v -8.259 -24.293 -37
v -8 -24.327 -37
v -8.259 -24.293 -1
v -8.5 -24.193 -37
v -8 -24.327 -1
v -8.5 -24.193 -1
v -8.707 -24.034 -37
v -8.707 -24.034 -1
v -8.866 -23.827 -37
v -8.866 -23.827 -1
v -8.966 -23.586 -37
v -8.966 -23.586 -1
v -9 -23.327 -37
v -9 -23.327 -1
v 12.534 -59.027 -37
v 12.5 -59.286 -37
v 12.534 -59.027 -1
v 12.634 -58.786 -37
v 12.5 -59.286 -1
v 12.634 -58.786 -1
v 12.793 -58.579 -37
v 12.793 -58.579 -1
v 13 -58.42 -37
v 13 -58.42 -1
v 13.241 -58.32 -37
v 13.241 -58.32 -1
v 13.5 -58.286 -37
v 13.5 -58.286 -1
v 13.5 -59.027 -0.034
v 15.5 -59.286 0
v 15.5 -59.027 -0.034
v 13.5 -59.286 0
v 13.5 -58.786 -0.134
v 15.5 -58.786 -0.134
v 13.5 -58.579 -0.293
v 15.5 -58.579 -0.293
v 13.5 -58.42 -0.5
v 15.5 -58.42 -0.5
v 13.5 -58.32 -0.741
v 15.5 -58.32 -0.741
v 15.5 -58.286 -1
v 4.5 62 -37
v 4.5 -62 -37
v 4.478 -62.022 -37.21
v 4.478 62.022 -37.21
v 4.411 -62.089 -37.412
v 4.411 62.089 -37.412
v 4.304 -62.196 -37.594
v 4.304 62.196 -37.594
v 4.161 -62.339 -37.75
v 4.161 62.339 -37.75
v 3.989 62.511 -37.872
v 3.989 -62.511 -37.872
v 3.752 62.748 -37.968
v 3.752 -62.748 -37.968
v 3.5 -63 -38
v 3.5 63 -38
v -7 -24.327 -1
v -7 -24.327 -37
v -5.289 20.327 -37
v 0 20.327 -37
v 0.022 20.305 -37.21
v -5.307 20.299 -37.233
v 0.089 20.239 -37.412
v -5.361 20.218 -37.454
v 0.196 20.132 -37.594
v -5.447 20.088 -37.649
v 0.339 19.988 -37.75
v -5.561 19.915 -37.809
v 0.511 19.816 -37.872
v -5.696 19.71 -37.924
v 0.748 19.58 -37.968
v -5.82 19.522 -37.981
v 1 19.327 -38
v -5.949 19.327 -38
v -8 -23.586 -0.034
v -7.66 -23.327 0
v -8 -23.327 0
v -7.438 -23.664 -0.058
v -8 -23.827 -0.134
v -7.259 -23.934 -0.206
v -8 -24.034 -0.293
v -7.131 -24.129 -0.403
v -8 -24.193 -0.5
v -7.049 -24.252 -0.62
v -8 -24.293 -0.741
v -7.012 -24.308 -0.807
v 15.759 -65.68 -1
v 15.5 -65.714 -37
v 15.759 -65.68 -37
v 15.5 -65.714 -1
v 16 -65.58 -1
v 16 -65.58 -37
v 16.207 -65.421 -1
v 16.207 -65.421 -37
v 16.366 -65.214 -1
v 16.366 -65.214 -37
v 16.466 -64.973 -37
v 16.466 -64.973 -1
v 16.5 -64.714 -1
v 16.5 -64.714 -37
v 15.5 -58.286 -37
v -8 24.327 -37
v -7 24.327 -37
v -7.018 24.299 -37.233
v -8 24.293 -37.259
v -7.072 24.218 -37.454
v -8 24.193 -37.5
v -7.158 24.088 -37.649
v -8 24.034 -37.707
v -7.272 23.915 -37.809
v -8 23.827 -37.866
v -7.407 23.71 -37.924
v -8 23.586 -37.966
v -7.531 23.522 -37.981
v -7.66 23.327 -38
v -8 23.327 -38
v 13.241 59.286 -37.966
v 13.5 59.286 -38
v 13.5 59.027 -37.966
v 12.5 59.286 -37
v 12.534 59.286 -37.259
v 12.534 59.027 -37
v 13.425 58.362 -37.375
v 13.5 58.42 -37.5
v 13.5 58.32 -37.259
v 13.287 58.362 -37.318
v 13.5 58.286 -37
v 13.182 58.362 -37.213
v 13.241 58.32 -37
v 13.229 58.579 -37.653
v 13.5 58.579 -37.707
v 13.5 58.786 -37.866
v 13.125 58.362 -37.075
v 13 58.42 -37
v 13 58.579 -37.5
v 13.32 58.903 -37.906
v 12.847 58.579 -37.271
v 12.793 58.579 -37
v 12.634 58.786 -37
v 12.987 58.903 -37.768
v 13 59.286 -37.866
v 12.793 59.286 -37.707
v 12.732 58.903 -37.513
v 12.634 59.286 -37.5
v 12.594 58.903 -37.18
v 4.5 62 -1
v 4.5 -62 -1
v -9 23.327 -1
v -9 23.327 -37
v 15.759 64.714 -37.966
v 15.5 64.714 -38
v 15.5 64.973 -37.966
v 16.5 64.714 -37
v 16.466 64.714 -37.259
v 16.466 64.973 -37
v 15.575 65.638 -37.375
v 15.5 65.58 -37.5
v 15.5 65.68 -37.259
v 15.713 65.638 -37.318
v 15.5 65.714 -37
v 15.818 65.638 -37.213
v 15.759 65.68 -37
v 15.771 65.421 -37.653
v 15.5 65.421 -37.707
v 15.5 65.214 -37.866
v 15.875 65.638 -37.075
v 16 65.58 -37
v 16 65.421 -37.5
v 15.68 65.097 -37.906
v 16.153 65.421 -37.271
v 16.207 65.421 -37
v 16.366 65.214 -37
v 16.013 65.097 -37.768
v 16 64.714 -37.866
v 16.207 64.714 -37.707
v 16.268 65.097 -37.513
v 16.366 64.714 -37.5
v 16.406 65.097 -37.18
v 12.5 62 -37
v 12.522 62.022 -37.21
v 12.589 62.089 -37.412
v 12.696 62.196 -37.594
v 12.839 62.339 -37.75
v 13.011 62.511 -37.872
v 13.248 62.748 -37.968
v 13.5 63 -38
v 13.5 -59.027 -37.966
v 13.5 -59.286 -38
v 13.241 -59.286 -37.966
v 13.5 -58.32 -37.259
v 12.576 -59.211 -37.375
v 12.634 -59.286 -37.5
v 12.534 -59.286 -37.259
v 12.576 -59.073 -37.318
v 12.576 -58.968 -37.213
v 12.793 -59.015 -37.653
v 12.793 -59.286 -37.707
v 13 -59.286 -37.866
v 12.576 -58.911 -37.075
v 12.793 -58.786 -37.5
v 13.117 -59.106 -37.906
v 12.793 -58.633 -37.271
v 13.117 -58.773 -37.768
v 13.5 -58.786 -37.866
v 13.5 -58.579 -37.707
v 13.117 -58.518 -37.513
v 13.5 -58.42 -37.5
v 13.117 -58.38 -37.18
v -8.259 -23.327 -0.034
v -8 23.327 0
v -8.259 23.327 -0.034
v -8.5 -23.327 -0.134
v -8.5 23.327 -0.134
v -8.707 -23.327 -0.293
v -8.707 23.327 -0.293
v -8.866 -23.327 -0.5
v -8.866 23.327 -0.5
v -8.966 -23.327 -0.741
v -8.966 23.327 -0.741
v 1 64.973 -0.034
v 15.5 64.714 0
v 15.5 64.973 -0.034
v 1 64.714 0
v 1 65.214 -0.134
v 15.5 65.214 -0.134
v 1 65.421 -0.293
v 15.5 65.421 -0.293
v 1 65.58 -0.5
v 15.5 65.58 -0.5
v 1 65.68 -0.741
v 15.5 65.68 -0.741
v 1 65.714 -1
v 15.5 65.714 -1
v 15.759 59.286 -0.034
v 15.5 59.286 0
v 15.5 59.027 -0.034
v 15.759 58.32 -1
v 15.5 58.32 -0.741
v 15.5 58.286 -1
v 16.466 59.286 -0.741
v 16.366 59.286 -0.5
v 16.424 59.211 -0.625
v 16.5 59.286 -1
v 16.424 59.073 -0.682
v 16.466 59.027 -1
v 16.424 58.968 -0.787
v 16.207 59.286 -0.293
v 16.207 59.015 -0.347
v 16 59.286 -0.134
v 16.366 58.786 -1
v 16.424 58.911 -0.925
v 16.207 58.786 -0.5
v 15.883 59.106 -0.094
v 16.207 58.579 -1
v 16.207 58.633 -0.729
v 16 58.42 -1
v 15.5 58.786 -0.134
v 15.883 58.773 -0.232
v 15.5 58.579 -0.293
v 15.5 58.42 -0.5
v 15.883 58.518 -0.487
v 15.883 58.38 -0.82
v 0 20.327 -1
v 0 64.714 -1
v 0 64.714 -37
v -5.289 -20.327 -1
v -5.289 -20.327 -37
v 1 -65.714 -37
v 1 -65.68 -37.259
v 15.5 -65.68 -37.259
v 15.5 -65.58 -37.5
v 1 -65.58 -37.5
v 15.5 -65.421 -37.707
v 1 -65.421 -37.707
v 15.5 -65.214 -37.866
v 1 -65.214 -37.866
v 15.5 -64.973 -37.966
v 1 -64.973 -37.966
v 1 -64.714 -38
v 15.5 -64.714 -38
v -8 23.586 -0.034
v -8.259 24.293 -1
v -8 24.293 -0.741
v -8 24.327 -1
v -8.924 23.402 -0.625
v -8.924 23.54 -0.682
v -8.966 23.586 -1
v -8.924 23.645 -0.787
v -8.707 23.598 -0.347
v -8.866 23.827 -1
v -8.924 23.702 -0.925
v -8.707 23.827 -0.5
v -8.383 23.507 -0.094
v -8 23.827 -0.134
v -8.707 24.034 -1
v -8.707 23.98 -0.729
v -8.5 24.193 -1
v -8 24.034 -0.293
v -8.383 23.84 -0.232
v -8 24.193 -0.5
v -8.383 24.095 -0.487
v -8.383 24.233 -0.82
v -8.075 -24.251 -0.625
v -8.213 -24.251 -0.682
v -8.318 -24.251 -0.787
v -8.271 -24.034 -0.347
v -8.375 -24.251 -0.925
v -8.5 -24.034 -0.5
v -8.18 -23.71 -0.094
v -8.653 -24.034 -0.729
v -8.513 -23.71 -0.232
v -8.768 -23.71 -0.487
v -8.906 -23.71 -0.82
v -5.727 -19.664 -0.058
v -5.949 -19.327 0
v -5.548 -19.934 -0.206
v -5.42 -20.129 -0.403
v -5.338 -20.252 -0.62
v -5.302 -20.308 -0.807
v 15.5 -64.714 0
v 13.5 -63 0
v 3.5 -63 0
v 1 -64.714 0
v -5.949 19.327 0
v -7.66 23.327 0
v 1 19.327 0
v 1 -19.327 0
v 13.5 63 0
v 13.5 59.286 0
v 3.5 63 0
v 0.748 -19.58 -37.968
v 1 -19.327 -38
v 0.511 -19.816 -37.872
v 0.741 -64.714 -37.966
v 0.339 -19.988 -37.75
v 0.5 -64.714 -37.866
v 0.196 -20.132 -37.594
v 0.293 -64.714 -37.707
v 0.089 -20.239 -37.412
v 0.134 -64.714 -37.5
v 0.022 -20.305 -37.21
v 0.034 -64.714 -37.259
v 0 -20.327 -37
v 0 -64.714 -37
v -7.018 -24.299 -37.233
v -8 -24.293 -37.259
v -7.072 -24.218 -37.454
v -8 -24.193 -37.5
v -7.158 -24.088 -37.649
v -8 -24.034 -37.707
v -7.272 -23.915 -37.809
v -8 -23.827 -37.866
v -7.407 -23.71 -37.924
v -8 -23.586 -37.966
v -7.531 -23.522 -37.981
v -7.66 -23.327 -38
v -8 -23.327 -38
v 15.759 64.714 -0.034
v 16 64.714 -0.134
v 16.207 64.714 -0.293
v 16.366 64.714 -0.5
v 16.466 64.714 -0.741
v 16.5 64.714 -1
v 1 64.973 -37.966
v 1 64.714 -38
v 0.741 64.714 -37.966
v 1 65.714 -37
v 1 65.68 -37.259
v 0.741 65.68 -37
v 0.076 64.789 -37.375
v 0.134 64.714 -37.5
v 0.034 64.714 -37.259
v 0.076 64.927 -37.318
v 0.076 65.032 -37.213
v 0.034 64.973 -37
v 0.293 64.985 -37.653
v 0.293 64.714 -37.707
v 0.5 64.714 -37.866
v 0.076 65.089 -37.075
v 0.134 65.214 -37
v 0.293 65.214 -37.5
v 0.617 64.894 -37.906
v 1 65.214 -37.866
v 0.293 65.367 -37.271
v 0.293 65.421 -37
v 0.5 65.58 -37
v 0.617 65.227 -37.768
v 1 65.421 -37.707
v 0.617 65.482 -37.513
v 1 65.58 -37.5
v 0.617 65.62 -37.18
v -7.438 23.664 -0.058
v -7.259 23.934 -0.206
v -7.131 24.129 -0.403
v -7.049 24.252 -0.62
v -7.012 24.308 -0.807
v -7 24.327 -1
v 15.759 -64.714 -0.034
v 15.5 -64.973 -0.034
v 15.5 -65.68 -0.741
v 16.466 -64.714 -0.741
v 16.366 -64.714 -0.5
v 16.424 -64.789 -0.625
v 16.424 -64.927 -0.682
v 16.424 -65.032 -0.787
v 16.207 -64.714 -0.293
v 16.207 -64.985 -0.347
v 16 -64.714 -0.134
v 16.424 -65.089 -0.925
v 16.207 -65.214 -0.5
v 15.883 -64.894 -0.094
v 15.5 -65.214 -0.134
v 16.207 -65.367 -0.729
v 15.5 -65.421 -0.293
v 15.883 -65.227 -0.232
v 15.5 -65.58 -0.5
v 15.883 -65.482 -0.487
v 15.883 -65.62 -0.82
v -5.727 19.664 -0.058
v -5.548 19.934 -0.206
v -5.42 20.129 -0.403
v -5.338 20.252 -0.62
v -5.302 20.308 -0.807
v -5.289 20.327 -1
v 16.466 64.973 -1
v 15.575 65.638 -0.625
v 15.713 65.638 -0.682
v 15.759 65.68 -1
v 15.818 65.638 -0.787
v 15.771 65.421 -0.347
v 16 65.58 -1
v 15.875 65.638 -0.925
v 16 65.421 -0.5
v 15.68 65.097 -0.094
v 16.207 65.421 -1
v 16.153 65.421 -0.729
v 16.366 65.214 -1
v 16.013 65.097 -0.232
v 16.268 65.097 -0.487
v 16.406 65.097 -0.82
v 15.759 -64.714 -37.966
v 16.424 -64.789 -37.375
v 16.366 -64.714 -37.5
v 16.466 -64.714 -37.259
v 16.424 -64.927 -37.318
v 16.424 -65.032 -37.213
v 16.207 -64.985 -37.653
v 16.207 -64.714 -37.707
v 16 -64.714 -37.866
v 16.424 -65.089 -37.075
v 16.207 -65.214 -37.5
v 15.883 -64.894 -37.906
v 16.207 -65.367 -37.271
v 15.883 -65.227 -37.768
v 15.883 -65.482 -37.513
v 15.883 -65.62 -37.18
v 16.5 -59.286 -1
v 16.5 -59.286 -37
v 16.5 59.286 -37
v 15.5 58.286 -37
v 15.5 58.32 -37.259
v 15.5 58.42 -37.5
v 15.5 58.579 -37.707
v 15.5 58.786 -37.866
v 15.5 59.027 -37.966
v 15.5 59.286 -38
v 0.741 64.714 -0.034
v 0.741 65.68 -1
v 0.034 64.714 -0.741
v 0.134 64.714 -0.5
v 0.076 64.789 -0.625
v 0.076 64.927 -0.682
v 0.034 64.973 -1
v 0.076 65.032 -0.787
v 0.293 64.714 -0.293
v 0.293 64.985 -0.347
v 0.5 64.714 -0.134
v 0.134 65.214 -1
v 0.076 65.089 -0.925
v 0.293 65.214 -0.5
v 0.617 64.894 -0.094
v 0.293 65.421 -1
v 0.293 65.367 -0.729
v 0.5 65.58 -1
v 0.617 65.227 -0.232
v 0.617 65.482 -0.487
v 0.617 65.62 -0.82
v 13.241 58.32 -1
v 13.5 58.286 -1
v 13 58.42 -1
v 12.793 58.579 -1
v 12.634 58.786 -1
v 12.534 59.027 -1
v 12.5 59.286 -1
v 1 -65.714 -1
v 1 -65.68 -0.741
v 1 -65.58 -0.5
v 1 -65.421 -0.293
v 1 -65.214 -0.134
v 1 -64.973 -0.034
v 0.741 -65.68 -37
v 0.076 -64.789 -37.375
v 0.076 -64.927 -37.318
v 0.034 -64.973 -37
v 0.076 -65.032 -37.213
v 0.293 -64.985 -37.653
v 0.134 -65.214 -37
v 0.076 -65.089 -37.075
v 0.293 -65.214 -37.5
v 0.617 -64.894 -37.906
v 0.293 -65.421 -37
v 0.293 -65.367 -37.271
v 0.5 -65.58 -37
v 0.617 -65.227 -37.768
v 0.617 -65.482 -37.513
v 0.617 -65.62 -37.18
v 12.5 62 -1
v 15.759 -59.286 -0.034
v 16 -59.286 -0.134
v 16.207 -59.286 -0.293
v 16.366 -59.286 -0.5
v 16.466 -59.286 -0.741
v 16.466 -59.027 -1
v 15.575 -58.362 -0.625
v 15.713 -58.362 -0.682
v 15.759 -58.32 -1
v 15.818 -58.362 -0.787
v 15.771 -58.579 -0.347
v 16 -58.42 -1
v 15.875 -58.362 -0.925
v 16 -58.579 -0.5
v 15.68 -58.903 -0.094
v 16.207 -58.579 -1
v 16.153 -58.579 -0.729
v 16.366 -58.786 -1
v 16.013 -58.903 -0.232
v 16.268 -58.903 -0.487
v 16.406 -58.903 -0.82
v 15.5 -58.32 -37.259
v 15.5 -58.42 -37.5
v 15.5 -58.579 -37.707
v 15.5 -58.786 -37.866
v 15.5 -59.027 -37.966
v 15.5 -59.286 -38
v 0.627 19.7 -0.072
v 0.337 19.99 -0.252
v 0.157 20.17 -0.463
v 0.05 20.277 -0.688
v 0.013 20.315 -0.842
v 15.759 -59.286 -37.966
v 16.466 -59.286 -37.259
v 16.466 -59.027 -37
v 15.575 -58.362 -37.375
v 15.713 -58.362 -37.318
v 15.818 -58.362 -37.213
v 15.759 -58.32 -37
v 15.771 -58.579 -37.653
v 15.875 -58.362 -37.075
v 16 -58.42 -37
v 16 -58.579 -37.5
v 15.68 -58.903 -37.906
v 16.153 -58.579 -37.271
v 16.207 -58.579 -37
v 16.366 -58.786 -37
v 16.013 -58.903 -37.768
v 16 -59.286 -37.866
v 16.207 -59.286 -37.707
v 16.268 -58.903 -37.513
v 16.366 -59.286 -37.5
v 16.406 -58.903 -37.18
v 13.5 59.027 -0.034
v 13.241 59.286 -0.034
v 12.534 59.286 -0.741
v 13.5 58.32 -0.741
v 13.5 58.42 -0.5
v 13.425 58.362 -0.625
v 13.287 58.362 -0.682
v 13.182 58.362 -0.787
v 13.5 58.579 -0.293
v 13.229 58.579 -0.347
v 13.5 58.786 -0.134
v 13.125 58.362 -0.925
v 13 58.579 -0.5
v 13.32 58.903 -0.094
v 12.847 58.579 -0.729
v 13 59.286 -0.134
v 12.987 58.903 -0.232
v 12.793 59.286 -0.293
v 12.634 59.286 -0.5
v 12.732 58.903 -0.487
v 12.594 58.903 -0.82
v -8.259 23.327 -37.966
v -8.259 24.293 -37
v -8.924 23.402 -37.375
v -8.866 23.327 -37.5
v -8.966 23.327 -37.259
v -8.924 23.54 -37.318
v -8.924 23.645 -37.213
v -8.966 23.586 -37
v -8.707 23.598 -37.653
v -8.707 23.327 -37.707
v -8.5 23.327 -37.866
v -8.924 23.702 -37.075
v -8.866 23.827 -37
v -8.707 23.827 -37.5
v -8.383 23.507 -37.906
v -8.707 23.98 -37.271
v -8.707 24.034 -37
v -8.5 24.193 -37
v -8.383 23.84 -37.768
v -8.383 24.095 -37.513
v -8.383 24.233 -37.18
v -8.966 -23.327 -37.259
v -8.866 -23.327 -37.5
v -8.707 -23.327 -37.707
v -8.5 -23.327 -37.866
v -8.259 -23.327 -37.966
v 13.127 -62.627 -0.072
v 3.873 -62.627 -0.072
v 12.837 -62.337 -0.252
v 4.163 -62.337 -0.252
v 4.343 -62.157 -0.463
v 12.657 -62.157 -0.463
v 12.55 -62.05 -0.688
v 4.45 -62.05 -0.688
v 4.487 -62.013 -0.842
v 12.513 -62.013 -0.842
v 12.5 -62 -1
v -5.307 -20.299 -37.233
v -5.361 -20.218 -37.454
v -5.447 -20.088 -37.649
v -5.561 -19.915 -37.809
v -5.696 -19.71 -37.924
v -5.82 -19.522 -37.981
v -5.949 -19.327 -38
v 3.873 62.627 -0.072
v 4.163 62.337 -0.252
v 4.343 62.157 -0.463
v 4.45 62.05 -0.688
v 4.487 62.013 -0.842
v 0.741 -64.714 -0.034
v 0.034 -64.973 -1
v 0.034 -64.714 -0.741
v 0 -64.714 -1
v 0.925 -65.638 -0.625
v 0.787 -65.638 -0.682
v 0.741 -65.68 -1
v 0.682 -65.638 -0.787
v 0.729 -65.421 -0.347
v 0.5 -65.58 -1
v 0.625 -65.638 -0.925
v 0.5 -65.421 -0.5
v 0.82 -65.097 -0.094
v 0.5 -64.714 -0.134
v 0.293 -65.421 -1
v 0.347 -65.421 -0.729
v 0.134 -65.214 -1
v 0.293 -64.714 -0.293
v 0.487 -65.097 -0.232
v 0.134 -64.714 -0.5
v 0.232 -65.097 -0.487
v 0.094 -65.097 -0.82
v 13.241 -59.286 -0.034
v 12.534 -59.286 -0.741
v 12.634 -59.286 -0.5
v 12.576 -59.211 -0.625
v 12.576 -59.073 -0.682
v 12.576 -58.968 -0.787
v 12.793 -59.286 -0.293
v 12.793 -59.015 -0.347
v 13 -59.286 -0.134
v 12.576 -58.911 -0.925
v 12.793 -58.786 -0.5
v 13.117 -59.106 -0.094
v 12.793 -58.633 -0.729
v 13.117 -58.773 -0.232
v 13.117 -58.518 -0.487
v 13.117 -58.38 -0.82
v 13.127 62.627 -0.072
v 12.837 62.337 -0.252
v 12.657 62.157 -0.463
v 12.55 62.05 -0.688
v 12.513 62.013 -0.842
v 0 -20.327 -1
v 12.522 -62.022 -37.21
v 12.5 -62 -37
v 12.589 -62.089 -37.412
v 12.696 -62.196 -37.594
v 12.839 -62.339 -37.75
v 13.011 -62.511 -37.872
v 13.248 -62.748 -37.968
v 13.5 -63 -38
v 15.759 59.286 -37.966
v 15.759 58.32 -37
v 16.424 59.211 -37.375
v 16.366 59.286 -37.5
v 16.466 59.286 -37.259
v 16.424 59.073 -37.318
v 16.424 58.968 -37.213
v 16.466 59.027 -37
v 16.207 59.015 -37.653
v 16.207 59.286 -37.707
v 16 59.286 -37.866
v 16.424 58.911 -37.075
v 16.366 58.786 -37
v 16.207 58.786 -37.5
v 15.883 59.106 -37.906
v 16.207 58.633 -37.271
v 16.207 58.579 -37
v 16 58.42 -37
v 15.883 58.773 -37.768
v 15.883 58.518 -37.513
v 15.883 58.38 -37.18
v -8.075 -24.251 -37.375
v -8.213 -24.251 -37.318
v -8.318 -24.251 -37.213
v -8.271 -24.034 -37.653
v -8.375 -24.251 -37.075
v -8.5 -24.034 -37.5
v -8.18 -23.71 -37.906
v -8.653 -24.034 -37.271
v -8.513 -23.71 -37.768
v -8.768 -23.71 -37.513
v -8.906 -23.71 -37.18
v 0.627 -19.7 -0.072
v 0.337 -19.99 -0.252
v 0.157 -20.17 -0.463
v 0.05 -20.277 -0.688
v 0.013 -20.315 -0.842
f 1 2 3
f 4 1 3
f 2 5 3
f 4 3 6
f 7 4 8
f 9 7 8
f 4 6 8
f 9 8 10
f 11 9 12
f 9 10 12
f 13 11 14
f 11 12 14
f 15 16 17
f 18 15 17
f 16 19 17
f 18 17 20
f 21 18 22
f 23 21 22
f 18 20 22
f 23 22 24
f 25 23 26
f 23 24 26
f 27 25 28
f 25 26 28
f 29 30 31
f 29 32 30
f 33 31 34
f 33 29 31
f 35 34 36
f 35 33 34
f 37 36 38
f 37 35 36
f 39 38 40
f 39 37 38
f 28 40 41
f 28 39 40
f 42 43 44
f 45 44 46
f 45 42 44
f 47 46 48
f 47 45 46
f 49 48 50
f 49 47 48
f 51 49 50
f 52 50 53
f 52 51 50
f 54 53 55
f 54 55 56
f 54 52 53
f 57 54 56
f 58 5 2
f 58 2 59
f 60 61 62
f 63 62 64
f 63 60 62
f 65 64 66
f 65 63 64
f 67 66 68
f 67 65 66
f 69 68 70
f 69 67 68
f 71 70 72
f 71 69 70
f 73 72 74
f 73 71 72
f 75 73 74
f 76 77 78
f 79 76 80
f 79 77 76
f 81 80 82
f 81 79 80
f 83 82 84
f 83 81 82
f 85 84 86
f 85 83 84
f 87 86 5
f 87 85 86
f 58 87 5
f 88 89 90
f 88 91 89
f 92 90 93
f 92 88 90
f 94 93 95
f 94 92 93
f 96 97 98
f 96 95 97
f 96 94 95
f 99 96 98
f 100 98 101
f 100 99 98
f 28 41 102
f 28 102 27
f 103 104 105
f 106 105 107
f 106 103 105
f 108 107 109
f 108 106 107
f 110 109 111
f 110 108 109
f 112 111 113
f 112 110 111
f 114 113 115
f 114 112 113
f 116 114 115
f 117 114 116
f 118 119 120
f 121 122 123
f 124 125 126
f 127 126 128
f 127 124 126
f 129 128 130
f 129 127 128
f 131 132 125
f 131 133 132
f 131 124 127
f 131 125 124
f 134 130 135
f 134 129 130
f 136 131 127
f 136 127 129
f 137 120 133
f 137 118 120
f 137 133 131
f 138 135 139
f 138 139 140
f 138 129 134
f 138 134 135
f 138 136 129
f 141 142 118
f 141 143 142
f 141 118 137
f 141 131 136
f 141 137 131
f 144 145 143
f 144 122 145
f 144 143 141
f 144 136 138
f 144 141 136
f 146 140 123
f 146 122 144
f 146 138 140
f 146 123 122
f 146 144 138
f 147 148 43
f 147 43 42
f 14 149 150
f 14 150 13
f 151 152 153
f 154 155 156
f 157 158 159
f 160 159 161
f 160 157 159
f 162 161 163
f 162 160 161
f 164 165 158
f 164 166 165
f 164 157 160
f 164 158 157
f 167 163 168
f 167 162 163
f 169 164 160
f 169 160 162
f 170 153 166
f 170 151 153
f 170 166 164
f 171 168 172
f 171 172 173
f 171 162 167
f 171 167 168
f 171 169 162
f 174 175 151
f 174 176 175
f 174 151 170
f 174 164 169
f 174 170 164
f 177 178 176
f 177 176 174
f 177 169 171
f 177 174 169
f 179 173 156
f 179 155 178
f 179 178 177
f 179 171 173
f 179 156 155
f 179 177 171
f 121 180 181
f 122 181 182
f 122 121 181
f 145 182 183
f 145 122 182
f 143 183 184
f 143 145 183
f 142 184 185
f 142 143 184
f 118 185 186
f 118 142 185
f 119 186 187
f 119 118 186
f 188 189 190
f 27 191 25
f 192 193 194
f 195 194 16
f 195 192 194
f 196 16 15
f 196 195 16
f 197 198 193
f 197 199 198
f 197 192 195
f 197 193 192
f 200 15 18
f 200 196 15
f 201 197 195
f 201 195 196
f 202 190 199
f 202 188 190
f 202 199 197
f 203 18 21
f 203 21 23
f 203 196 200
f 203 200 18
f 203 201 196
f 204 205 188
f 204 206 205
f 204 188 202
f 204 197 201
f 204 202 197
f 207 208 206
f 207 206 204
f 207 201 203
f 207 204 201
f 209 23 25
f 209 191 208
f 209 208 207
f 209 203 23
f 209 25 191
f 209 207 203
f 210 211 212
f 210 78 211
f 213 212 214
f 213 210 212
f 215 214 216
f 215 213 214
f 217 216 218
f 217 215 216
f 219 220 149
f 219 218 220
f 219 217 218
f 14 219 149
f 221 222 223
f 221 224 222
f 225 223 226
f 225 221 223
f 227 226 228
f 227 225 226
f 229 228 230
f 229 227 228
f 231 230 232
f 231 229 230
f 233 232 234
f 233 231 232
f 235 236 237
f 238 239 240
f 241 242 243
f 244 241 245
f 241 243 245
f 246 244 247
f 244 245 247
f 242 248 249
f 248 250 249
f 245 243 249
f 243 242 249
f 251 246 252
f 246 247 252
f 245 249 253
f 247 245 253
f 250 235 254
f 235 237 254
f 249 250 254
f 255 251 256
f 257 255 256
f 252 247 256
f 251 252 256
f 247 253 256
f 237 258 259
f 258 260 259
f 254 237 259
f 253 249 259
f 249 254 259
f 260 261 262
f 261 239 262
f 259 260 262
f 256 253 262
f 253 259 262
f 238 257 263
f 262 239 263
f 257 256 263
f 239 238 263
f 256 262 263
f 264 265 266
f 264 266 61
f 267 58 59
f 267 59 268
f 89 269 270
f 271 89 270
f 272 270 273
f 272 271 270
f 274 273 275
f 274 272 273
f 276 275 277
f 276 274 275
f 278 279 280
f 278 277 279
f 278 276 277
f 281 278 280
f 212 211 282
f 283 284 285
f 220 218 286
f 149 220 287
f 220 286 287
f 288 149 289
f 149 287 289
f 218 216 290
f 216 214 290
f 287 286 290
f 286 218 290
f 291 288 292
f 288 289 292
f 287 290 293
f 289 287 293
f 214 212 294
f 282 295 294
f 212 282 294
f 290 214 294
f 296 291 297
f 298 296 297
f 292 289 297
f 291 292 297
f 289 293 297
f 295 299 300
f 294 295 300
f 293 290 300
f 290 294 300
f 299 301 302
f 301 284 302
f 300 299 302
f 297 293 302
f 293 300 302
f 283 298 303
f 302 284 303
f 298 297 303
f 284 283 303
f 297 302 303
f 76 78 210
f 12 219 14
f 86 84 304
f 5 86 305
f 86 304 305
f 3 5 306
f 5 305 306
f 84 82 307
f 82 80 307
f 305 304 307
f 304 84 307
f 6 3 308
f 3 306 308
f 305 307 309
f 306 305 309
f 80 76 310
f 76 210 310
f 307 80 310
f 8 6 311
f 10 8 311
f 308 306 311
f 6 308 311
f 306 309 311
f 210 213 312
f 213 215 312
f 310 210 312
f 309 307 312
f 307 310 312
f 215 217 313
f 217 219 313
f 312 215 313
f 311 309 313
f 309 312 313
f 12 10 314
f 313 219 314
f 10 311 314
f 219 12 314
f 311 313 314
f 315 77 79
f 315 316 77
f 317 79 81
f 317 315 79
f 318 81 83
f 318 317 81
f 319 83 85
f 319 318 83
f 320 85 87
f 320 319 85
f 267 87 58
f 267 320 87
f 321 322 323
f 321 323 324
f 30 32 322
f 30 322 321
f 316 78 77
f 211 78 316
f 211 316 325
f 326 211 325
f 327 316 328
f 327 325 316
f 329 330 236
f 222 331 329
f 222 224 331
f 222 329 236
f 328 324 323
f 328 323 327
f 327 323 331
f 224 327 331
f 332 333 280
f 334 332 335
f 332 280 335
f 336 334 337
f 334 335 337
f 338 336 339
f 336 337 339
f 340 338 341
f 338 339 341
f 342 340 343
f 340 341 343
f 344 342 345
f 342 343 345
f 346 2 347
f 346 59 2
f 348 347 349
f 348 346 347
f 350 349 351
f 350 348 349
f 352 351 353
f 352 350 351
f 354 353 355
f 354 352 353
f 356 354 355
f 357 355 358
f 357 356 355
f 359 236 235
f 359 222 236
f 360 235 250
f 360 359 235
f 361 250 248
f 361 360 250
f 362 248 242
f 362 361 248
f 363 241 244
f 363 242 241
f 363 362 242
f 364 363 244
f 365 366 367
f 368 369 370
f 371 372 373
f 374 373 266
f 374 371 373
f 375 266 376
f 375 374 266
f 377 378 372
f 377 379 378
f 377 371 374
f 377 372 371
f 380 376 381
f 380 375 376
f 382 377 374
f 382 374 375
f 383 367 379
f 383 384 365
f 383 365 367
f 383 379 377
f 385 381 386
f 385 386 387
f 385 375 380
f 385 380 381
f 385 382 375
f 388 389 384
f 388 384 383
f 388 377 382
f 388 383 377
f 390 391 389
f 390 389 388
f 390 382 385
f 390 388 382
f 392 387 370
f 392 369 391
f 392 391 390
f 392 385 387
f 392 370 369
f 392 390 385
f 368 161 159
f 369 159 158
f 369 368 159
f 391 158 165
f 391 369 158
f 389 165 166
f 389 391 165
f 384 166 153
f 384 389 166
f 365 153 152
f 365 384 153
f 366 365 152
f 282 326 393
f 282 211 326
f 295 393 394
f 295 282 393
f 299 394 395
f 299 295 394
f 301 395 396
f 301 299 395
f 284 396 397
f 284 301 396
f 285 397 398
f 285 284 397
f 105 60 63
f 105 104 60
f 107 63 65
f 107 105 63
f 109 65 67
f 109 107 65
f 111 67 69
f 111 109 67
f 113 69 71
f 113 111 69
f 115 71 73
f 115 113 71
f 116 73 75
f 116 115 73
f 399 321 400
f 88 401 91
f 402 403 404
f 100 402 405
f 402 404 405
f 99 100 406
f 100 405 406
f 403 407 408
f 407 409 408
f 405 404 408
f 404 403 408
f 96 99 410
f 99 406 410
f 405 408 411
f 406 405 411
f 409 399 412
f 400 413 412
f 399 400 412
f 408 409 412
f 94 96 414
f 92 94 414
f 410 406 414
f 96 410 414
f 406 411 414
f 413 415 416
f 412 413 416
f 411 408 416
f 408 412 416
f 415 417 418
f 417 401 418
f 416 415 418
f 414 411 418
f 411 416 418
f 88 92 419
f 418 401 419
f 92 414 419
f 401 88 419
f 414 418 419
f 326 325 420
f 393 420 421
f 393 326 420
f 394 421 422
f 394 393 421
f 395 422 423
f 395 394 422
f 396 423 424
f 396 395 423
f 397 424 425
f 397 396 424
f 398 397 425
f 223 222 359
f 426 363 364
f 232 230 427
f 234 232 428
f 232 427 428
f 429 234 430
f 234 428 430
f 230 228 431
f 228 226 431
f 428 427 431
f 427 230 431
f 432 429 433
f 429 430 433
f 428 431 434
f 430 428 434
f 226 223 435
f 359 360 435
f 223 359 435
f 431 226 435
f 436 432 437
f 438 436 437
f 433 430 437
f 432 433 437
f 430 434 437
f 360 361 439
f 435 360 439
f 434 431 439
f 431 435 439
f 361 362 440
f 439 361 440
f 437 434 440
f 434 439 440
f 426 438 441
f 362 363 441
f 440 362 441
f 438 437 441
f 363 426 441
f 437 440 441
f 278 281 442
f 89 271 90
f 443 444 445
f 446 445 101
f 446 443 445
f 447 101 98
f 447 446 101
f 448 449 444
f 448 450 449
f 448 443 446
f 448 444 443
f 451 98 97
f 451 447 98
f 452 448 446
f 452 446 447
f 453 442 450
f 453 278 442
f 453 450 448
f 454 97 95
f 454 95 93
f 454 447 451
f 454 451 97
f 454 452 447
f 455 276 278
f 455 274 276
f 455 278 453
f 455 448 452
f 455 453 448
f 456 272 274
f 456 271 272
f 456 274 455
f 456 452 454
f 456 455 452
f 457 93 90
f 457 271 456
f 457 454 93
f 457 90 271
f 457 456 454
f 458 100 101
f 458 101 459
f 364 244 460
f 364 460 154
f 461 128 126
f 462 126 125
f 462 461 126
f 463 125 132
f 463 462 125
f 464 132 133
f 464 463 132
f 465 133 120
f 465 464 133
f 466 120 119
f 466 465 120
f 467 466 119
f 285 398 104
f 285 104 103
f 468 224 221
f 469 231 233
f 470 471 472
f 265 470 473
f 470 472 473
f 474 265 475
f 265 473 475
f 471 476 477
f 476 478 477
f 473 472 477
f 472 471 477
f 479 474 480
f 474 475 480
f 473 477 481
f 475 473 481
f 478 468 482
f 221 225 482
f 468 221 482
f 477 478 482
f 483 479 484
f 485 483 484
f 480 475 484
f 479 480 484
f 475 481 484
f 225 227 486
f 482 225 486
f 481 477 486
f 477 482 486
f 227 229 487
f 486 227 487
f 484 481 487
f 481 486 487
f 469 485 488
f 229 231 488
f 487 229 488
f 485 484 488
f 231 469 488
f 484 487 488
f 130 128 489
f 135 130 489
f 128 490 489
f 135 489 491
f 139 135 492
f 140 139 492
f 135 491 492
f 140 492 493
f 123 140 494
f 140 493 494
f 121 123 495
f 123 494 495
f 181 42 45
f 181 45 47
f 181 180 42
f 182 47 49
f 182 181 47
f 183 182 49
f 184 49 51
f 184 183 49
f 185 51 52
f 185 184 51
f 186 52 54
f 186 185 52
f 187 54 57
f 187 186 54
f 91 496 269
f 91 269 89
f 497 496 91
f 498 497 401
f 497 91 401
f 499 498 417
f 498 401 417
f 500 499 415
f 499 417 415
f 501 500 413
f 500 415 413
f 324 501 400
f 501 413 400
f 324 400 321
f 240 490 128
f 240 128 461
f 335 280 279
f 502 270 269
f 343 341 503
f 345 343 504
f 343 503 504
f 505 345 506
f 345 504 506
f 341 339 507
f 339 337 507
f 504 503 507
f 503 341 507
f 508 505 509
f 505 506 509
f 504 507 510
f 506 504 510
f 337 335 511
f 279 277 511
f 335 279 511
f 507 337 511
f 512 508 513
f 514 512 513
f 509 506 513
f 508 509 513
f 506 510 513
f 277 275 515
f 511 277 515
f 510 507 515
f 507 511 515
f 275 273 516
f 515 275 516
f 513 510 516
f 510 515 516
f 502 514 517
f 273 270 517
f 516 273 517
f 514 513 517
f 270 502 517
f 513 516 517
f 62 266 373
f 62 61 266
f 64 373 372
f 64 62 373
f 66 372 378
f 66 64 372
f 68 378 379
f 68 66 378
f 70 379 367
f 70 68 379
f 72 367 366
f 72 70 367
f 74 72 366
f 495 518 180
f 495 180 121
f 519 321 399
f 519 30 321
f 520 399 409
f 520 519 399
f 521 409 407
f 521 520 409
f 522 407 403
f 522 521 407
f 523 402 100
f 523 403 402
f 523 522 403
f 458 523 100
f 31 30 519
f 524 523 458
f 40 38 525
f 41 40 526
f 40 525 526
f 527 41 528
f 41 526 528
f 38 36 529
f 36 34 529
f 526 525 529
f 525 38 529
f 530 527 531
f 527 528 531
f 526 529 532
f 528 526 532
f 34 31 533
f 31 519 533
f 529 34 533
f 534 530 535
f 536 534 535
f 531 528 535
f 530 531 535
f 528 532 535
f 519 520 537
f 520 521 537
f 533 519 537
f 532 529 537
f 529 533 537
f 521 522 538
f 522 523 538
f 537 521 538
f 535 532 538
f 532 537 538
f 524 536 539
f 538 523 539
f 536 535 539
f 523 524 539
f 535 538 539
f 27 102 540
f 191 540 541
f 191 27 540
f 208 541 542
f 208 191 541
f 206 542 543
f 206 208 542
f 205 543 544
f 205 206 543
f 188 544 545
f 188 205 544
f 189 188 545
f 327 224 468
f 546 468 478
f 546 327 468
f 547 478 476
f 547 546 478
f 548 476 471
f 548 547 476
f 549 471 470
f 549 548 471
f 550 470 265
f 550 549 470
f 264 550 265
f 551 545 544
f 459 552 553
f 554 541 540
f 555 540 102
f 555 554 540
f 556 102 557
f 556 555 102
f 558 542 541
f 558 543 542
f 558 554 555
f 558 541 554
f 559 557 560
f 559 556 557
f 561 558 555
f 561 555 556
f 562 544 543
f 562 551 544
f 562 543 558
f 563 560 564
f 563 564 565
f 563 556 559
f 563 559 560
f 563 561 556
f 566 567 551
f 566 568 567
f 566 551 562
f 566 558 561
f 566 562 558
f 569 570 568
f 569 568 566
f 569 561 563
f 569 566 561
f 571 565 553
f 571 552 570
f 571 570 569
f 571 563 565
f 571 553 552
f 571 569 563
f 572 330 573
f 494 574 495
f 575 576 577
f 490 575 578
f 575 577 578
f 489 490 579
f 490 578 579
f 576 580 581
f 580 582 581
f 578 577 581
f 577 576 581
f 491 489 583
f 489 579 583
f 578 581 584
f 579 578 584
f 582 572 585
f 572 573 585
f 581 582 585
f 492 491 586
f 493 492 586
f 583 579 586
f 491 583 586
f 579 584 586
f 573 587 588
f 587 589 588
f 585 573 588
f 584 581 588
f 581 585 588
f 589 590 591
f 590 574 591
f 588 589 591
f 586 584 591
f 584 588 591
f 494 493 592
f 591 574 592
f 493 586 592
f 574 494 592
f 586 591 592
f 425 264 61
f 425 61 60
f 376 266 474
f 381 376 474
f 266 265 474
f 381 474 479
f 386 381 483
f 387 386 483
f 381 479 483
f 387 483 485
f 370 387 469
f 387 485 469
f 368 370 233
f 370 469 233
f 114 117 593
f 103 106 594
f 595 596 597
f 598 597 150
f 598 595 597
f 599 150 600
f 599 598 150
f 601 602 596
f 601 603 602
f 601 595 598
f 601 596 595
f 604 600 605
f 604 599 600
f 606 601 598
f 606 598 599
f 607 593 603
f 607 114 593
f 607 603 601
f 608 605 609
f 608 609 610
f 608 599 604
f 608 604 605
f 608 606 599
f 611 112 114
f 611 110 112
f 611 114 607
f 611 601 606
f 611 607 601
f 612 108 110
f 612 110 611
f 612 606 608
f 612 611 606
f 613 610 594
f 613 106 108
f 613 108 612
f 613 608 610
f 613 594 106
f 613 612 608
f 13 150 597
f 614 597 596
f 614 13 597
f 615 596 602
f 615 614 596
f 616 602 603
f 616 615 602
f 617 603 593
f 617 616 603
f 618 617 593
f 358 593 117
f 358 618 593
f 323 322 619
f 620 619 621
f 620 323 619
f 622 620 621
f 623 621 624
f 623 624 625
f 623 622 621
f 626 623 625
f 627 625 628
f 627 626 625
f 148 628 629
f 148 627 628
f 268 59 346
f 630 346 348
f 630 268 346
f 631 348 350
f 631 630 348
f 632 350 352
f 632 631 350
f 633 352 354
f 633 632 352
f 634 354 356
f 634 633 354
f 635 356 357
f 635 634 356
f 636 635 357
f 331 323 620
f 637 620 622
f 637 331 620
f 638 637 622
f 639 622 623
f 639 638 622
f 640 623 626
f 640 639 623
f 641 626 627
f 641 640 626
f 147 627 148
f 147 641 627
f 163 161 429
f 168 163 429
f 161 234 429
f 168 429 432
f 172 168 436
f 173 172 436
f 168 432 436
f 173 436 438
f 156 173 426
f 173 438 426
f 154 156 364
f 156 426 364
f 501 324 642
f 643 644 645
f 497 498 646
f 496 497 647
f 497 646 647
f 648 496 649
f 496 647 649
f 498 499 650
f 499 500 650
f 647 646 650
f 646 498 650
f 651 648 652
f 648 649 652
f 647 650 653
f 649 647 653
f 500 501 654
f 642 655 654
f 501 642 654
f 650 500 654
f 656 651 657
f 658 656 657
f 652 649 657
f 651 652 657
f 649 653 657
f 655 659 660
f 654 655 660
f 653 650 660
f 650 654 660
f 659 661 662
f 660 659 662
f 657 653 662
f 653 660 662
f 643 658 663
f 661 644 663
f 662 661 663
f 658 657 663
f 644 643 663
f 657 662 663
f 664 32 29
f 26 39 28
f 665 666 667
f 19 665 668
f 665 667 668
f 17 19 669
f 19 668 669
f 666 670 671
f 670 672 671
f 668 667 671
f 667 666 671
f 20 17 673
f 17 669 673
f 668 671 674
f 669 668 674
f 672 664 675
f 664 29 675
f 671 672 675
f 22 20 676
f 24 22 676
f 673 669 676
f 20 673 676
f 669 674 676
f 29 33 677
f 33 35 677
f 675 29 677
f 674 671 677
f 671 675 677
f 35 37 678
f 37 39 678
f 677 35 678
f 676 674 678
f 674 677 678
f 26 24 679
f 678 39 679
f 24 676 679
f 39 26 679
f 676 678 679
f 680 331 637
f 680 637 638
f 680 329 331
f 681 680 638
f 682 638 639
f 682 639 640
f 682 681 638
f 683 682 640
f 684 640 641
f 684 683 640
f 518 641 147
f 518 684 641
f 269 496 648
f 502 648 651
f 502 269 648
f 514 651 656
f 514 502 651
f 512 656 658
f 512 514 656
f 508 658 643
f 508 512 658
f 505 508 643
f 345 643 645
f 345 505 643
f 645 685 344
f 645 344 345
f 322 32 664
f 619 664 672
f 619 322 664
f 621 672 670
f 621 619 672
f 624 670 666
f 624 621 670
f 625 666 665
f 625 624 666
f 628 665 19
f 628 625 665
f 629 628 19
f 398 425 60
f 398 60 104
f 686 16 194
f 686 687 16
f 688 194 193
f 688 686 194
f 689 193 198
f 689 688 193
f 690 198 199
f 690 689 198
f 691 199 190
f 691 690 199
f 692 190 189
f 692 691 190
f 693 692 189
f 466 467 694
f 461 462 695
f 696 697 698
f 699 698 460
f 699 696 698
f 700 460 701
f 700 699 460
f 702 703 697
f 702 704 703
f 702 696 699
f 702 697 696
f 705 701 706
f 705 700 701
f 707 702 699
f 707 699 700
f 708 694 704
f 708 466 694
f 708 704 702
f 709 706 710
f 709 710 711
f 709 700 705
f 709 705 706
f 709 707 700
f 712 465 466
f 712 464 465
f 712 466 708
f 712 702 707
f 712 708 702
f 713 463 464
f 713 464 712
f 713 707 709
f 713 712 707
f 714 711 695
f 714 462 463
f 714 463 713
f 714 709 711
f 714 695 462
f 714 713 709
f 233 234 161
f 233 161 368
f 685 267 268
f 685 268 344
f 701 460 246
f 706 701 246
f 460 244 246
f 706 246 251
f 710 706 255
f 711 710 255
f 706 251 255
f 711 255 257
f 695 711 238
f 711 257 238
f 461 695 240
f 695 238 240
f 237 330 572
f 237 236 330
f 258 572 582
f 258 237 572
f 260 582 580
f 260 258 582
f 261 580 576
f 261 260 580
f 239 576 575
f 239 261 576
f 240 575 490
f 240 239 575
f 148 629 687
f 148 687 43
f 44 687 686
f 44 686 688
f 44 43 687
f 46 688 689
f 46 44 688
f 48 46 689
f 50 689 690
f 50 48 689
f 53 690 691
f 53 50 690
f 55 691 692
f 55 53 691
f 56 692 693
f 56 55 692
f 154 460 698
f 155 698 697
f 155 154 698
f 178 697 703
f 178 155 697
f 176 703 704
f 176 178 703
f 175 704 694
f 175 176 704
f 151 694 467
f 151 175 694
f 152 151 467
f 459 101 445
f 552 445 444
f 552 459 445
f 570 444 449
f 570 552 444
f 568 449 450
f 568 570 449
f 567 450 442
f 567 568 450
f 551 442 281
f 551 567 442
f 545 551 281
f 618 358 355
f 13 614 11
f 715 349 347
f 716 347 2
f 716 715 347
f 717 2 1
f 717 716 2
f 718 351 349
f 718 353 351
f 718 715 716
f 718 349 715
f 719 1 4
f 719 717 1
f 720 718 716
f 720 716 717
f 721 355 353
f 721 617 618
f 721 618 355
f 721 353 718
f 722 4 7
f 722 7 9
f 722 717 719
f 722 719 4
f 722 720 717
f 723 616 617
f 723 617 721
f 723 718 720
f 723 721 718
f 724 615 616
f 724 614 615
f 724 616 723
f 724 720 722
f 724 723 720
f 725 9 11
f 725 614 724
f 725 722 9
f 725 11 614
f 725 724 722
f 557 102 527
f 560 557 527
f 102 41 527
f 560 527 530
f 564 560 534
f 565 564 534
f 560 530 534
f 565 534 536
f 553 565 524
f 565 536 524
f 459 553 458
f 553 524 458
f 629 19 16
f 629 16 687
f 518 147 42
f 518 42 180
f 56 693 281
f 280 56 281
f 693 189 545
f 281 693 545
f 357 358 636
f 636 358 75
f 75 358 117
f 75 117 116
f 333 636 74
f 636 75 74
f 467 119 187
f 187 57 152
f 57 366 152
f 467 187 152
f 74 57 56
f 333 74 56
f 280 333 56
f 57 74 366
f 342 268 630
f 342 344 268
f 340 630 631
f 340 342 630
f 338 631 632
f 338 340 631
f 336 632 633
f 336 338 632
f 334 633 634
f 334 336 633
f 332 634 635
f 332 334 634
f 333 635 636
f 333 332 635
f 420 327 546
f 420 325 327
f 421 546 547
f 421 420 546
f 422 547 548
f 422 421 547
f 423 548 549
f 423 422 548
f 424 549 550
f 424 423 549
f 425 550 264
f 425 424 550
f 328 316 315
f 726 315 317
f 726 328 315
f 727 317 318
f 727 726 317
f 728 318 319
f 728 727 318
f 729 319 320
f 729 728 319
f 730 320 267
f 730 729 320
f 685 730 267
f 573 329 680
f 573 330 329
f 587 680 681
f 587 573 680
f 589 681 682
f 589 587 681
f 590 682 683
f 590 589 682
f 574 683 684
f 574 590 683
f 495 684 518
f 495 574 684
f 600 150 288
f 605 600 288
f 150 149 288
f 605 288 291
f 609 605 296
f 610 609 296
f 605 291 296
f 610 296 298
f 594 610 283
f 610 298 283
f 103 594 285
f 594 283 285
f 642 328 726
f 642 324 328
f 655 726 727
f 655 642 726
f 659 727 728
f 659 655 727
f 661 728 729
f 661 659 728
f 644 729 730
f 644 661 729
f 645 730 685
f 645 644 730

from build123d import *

# Parameters (mm, degrees)
F1_DEPTH = 4
F2_DEPTH = 38
F3_R     = 1


with BuildPart() as f1:
    # F0 (on Top) → F1 (new body)
    with BuildSketch(Plane.XY):
        Polygon((0, 20.327126), (0, 0), (0, -20.327126), (0, -65.713919), (12.5, -65.713919), (16.5, -65.713919), (16.5, -62), (16.5, -58.286081), (12.5, -58.286081), (12.5, -62), (4.5, -62), (4.5, 0), (4.5, 62), (12.5, 62), (12.5, 58.286081), (16.5, 58.286081), (16.5, 62), (16.5, 65.713919), (12.5, 65.713919), (0, 65.713919), align=None)
        Polygon((0, -20.327126), (0, 0), (0, 20.327126), (-5.289079, 20.327126), (-7, 24.327126), (-9, 24.327126), (-9, 0), (-9, -24.327126), (-7, -24.327126), (-5.289079, -20.327126), align=None)
    extrude(amount=-F1_DEPTH)

    # F0 (on Top) → F2 (join)
    with BuildSketch(Plane.XY):
        Polygon((0, -20.327126), (0, 0), (0, 20.327126), (-5.289079, 20.327126), (-7, 24.327126), (-9, 24.327126), (-9, 0), (-9, -24.327126), (-7, -24.327126), (-5.289079, -20.327126), align=None)
        Polygon((0, 20.327126), (0, 0), (0, -20.327126), (0, -65.713919), (12.5, -65.713919), (16.5, -65.713919), (16.5, -62), (16.5, -58.286081), (12.5, -58.286081), (12.5, -62), (4.5, -62), (4.5, 0), (4.5, 62), (12.5, 62), (12.5, 58.286081), (16.5, 58.286081), (16.5, 62), (16.5, 65.713919), (12.5, 65.713919), (0, 65.713919), align=None)
    extrude(amount=-F2_DEPTH)

    # F3
    f3_edges = [f1.edges().sort_by_distance(p)[0] for p in [
        (0, -43.020523, 0),
        (8.25, -65.713919, 0),
        (16.5, -62, 0),
        (14.5, -58.286081, 0),
        (12.5, -60.143041, 0),
        (8.5, -62, 0),
        (4.5, 0, 0),
        (8.5, 62, 0),
        (12.5, 60.143041, 0),
        (14.5, 58.286081, 0),
        (16.5, 62, 0),
        (8.25, 65.713919, 0),
        (0, 43.020523, 0),
        (-2.64454, 20.327126, 0),
        (-6.14454, 22.327126, 0),
        (-8, 24.327126, 0),
        (-9, 0, 0),
        (-8, -24.327126, 0),
        (-6.14454, -22.327126, 0),
        (-2.64454, -20.327126, 0),
        (8.25, -65.713919, -38),
        (16.5, -62, -38),
        (14.5, -58.286081, -38),
        (12.5, -60.143041, -38),
        (8.5, -62, -38),
        (4.5, 0, -38),
        (8.5, 62, -38),
        (12.5, 60.143041, -38),
        (14.5, 58.286081, -38),
        (16.5, 62, -38),
        (8.25, 65.713919, -38),
        (0, 43.020523, -38),
        (-2.64454, 20.327126, -38),
        (-6.14454, 22.327126, -38),
        (-8, 24.327126, -38),
        (-9, 0, -38),
        (-8, -24.327126, -38),
        (-6.14454, -22.327126, -38),
        (-2.64454, -20.327126, -38),
        (0, -43.020523, -38),
        (16.5, -58.286081, -19),
        (12.5, -58.286081, -19),
        (12.5, 58.286081, -19),
        (16.5, 58.286081, -19),
        (-9, 24.327126, -19),
        (-9, -24.327126, -19),
        (16.5, 65.713919, -19),
        (0, 65.713919, -19),
        (0, -65.713919, -19),
        (16.5, -65.713919, -19),
    ]]
    fillet(f3_edges, radius=F3_R)


solid = f1.part
